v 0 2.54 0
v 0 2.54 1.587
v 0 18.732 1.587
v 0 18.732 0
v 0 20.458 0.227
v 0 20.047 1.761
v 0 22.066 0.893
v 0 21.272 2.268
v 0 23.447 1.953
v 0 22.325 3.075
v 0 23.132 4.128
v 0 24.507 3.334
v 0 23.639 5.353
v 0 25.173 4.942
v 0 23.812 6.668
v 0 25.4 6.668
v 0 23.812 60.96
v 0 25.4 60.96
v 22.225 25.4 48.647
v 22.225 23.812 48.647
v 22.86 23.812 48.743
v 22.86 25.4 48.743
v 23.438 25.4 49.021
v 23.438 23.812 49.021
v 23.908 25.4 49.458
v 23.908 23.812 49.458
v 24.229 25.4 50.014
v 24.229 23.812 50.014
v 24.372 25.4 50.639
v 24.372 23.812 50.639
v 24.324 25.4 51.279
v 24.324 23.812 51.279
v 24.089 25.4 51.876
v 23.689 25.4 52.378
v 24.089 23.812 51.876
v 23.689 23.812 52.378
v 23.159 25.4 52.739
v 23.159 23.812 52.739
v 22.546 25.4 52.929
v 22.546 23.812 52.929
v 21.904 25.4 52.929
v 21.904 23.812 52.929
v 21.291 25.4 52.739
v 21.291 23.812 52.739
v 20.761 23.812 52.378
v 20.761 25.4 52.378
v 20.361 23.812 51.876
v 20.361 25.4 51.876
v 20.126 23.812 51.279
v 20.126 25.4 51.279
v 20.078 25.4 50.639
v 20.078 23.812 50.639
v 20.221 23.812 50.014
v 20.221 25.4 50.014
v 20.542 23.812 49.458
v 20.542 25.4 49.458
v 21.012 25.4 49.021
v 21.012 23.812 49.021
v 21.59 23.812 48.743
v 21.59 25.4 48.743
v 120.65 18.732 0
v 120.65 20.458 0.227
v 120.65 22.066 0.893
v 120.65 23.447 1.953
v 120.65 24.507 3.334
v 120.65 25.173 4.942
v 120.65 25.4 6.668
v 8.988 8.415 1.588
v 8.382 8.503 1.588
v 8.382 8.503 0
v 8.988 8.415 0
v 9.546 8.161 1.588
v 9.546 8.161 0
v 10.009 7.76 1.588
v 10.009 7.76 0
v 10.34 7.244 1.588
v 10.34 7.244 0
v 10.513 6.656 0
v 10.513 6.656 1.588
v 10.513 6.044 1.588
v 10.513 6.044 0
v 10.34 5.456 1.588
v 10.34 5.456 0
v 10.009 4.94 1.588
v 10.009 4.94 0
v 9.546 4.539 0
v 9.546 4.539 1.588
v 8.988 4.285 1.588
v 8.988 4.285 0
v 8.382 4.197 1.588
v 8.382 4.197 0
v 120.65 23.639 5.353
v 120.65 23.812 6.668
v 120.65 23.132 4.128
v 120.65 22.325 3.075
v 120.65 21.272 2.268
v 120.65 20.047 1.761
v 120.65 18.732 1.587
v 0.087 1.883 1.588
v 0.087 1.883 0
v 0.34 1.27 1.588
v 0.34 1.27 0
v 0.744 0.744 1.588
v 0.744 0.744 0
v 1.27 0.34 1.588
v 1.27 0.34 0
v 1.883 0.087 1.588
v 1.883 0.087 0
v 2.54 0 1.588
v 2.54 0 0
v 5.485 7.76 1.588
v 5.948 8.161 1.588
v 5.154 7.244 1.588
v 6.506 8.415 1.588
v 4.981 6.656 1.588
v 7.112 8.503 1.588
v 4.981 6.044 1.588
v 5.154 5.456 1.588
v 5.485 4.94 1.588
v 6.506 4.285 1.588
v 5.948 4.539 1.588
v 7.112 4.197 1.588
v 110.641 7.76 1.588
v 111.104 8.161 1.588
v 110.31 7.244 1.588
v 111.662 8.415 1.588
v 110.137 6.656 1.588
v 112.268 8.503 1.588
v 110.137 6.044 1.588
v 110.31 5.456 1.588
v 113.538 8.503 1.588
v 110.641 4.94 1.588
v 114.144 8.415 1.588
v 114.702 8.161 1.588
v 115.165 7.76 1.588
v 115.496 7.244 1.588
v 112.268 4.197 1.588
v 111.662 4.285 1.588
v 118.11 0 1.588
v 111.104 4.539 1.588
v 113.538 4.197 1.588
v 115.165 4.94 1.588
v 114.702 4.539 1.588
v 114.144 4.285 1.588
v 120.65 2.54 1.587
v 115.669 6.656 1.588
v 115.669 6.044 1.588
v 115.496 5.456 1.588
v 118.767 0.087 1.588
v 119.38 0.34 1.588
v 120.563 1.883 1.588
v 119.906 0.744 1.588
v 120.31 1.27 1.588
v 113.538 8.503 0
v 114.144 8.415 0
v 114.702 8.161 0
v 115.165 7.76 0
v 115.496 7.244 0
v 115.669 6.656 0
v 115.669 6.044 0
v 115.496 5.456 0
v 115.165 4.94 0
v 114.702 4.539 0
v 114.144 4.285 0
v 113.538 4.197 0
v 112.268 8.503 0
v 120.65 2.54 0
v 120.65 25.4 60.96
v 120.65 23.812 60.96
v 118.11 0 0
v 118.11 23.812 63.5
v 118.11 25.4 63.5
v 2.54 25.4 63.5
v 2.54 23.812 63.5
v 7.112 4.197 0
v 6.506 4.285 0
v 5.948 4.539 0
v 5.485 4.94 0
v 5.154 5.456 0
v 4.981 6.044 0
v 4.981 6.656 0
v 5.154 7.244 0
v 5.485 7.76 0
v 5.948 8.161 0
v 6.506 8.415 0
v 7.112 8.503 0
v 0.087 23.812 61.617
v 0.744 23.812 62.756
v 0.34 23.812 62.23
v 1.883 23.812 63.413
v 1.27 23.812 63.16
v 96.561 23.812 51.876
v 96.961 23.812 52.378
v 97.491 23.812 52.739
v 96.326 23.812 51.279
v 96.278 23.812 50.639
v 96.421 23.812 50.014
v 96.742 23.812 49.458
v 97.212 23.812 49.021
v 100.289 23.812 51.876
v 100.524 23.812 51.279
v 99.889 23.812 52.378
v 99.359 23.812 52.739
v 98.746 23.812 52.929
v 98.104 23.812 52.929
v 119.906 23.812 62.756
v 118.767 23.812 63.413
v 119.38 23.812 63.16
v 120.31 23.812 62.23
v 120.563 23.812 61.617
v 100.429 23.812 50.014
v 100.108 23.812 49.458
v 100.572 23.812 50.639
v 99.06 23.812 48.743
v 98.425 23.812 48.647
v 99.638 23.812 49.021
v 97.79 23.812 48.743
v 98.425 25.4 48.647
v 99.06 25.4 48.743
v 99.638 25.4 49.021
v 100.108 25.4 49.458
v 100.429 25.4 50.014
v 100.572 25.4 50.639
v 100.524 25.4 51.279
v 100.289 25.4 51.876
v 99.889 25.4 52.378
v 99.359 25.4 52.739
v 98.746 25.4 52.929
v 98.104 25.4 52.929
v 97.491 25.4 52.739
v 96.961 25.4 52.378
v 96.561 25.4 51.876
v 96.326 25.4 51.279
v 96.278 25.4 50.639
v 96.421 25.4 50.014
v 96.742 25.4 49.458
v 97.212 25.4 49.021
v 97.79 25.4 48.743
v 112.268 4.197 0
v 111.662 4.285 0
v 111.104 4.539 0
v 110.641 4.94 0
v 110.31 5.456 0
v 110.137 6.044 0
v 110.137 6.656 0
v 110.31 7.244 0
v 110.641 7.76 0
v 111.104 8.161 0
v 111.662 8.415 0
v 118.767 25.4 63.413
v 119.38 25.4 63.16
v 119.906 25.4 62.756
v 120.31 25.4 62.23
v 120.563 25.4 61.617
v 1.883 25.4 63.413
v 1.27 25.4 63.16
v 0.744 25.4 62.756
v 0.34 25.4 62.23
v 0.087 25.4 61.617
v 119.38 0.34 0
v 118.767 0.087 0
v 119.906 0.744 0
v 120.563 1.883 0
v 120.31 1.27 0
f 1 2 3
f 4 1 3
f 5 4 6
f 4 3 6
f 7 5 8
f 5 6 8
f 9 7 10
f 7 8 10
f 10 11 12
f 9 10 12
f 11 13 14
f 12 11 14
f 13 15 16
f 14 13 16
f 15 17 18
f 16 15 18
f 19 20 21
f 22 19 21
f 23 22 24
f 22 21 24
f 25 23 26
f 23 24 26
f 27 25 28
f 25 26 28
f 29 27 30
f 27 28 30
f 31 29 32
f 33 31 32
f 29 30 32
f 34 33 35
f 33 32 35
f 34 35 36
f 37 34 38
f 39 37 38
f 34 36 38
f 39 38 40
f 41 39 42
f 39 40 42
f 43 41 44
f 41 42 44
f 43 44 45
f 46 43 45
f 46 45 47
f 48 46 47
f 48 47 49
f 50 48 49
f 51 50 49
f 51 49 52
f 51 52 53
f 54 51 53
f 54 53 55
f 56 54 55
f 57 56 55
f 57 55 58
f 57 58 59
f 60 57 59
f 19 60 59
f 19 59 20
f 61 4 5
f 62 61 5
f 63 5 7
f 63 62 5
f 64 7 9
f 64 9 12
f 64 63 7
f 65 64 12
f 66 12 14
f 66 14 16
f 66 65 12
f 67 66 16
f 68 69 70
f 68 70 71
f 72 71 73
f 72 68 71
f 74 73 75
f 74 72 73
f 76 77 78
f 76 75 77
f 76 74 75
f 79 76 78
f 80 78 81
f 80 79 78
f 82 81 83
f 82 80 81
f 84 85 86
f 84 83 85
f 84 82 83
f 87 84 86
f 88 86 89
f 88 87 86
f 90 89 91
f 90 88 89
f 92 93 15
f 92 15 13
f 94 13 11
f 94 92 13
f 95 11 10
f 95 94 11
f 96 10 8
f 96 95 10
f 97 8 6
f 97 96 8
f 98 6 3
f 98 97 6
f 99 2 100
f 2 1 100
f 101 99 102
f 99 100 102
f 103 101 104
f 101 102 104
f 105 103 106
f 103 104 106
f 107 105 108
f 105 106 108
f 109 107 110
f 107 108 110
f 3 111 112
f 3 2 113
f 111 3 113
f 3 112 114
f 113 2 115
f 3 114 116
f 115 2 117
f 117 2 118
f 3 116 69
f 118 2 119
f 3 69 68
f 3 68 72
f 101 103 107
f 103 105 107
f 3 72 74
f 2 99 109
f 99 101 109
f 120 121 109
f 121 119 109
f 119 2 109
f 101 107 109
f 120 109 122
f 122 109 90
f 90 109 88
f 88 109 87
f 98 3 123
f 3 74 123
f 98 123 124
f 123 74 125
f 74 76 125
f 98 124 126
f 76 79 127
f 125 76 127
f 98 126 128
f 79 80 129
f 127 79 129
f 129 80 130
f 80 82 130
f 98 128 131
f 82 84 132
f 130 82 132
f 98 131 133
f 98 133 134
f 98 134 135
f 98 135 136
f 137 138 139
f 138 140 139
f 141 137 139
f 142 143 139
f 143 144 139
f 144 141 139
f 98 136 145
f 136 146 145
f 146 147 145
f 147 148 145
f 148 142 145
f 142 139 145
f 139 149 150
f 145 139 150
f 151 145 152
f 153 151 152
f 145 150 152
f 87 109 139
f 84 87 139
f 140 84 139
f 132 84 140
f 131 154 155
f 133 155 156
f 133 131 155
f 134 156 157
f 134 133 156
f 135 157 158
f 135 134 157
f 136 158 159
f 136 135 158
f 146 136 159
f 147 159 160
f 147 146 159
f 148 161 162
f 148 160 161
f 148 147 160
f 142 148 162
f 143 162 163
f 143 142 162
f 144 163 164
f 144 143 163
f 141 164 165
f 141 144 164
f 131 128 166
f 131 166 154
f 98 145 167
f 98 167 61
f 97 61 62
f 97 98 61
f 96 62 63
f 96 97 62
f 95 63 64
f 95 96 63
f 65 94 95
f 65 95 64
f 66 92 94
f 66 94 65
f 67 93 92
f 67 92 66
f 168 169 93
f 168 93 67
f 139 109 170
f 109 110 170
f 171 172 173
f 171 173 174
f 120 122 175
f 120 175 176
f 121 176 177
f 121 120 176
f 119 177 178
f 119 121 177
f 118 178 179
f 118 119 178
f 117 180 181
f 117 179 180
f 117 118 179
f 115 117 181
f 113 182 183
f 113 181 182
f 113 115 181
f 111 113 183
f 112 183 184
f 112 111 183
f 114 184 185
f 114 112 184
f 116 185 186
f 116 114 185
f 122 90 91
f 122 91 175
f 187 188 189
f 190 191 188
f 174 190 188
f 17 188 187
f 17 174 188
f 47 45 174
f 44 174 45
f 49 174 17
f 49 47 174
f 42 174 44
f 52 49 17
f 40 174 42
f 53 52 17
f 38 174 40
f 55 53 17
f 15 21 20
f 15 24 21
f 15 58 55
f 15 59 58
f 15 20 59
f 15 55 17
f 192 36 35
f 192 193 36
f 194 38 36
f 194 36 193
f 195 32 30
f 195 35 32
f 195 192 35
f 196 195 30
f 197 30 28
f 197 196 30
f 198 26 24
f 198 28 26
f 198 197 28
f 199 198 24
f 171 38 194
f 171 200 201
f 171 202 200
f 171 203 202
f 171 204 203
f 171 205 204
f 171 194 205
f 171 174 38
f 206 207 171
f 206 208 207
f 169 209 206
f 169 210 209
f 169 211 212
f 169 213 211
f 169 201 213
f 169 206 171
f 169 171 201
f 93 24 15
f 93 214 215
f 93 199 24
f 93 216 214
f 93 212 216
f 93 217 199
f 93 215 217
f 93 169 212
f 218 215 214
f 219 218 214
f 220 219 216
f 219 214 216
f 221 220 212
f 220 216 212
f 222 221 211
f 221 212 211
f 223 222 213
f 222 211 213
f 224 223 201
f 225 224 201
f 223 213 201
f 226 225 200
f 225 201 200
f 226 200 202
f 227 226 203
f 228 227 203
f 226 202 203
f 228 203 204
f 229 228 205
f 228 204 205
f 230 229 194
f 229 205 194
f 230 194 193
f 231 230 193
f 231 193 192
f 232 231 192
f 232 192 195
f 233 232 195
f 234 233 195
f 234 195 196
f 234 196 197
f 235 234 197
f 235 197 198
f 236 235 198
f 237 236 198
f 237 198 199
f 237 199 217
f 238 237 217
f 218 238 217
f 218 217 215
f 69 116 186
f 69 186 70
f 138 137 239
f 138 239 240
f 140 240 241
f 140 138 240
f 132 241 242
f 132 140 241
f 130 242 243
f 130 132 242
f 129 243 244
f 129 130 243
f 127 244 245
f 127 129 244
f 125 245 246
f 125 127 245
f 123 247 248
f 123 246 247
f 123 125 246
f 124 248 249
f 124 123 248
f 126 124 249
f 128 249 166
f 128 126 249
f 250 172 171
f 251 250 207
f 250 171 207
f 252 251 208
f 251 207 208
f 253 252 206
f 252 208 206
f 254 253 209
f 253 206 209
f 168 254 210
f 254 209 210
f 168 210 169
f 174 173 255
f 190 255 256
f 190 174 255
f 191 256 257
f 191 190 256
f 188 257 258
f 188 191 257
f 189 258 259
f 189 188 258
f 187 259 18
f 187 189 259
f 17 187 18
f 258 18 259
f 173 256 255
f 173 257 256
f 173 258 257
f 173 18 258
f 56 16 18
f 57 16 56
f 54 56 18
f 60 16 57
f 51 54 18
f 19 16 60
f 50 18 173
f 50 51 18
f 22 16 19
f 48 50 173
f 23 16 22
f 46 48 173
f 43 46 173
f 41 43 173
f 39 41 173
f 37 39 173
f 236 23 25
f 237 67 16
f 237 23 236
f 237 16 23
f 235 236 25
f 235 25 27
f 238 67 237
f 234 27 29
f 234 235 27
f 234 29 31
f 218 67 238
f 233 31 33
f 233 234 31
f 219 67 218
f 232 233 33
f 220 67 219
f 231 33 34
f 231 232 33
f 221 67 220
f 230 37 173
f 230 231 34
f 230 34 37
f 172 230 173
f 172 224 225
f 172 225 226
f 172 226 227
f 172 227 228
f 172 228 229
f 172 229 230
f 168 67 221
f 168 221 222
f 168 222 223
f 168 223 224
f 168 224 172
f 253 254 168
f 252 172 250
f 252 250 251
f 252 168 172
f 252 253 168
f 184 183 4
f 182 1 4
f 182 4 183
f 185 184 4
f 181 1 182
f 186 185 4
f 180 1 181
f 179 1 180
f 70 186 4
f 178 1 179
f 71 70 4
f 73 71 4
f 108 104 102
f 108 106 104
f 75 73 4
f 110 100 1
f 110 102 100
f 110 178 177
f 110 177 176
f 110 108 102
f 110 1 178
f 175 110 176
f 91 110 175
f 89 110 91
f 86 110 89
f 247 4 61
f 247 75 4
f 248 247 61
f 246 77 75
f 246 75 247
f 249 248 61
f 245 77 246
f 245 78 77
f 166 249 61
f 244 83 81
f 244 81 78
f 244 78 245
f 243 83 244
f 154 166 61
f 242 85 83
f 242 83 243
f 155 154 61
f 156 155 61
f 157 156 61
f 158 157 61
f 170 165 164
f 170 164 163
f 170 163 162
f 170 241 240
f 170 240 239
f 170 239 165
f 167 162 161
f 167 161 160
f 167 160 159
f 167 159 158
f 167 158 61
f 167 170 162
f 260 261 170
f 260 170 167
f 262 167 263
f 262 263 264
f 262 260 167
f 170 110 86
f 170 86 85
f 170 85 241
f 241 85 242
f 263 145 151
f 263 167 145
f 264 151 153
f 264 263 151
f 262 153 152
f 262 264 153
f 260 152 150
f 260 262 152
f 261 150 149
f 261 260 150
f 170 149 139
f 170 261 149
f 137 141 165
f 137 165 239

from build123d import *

# Parameters (mm, degrees)
SKETCH2_W                    = 120.65
SKETCH2_H                    = 1.5875
BASE_FLANGE1_DEPTH           = 25.4
EDGE_FLANGE1_STRIP_W         = 16.51
EDGE_FLANGE1_STRIP_H         = 1.5875
EDGE_FLANGE1_STRIP_CUT_DEPTH = 120.65
EDGE_FLANGE1_DEPTH           = 120.65
FILLET1_R                    = 2.54
CUT_EXTRUDE1_DEPTH           = 138.966445762
SKETCH11_R                   = 2.15265
CUT_EXTRUDE2_DEPTH           = 139.404146095


# Sheet-metal steps are written as plain solids
with BuildPart() as part:
    # Sketch2 → Base-Flange1 (new body)
    with BuildSketch(Plane(origin=(0, 0, 0), x_dir=(1, 0, 0), z_dir=(0, 1, 0))):
        with Locations((60.325, -0.79375)):
            Rectangle(SKETCH2_W, SKETCH2_H)
    extrude(amount=BASE_FLANGE1_DEPTH)

    # Edge-Flange1 strip (across the edge) → Edge-Flange1 strip cut (cut)
    with BuildSketch(Plane(origin=(120.65, 25.4, 1.5875), x_dir=(0, -1, 0), z_dir=(-1, 0, 0))):
        with Locations((-1.5875, -0.79375)):
            Rectangle(EDGE_FLANGE1_STRIP_W, EDGE_FLANGE1_STRIP_H)
    extrude(amount=EDGE_FLANGE1_STRIP_CUT_DEPTH, mode=Mode.SUBTRACT)

    # Edge-Flange1 section (across the edge) → Edge-Flange1 (add)
    with BuildSketch(Plane(origin=(120.65, 25.4, 1.5875), x_dir=(0, -1, 0), z_dir=(-1, 0, 0))):
        with BuildLine():
            Line((0, 5.08), (0, 61.9125))
            Line((0, 61.9125), (1.5875, 61.9125))
            Line((1.5875, 61.9125), (1.5875, 5.08))
            ThreePointArc((1.5875, 5.08), (3.075397552, 1.487897552), (6.6675, 0))
            Line((6.6675, 0), (6.6675, -1.5875))
            ThreePointArc((6.6675, -1.5875), (1.952865536, 0.365365536), (0, 5.08))
        make_face()
    extrude(amount=EDGE_FLANGE1_DEPTH)

    # Fillet1
    fillet1_edges = [part.edges().sort_by_distance(p)[0] for p in [
        (120.65, 24.60625, 63.5),
        (0, 24.60625, 63.5),
        (0, 0, 0.79375),
        (120.65, 0, 0.79375),
    ]]
    fillet(fillet1_edges, radius=FILLET1_R)

    # Sketch10 → Cut-Extrude1 (cut, through all)
    with BuildSketch(Plane.XY.offset(1.5875)):
        with BuildLine():
            Line((7.112, 8.50265), (8.382, 8.50265))
            ThreePointArc((8.382, 8.50265), (10.53465, 6.35), (8.382, 4.19735))
            Line((8.382, 4.19735), (7.112, 4.19735))
            ThreePointArc((7.112, 4.19735), (4.95935, 6.35), (7.112, 8.50265))
        make_face()
        with BuildLine():
            Line((112.268, 8.50265), (113.538, 8.50265))
            ThreePointArc((113.538, 8.50265), (115.69065, 6.35), (113.538, 4.19735))
            Line((113.538, 4.19735), (112.268, 4.19735))
            ThreePointArc((112.268, 4.19735), (110.11535, 6.35), (112.268, 8.50265))
        make_face()
    extrude(amount=-CUT_EXTRUDE1_DEPTH, mode=Mode.SUBTRACT)

    # Sketch11 → Cut-Extrude2 (cut, through all)
    with BuildSketch(Plane.XZ.offset(-23.8125)):
        with Locations(Location((22.225, 50.8, 0), (0, 0, 270))):
            Circle(SKETCH11_R)
        with Locations(Location((98.425, 50.8, 0), (0, 0, 270))):
            Circle(SKETCH11_R)
    extrude(amount=-CUT_EXTRUDE2_DEPTH, mode=Mode.SUBTRACT)


solid = part.part
